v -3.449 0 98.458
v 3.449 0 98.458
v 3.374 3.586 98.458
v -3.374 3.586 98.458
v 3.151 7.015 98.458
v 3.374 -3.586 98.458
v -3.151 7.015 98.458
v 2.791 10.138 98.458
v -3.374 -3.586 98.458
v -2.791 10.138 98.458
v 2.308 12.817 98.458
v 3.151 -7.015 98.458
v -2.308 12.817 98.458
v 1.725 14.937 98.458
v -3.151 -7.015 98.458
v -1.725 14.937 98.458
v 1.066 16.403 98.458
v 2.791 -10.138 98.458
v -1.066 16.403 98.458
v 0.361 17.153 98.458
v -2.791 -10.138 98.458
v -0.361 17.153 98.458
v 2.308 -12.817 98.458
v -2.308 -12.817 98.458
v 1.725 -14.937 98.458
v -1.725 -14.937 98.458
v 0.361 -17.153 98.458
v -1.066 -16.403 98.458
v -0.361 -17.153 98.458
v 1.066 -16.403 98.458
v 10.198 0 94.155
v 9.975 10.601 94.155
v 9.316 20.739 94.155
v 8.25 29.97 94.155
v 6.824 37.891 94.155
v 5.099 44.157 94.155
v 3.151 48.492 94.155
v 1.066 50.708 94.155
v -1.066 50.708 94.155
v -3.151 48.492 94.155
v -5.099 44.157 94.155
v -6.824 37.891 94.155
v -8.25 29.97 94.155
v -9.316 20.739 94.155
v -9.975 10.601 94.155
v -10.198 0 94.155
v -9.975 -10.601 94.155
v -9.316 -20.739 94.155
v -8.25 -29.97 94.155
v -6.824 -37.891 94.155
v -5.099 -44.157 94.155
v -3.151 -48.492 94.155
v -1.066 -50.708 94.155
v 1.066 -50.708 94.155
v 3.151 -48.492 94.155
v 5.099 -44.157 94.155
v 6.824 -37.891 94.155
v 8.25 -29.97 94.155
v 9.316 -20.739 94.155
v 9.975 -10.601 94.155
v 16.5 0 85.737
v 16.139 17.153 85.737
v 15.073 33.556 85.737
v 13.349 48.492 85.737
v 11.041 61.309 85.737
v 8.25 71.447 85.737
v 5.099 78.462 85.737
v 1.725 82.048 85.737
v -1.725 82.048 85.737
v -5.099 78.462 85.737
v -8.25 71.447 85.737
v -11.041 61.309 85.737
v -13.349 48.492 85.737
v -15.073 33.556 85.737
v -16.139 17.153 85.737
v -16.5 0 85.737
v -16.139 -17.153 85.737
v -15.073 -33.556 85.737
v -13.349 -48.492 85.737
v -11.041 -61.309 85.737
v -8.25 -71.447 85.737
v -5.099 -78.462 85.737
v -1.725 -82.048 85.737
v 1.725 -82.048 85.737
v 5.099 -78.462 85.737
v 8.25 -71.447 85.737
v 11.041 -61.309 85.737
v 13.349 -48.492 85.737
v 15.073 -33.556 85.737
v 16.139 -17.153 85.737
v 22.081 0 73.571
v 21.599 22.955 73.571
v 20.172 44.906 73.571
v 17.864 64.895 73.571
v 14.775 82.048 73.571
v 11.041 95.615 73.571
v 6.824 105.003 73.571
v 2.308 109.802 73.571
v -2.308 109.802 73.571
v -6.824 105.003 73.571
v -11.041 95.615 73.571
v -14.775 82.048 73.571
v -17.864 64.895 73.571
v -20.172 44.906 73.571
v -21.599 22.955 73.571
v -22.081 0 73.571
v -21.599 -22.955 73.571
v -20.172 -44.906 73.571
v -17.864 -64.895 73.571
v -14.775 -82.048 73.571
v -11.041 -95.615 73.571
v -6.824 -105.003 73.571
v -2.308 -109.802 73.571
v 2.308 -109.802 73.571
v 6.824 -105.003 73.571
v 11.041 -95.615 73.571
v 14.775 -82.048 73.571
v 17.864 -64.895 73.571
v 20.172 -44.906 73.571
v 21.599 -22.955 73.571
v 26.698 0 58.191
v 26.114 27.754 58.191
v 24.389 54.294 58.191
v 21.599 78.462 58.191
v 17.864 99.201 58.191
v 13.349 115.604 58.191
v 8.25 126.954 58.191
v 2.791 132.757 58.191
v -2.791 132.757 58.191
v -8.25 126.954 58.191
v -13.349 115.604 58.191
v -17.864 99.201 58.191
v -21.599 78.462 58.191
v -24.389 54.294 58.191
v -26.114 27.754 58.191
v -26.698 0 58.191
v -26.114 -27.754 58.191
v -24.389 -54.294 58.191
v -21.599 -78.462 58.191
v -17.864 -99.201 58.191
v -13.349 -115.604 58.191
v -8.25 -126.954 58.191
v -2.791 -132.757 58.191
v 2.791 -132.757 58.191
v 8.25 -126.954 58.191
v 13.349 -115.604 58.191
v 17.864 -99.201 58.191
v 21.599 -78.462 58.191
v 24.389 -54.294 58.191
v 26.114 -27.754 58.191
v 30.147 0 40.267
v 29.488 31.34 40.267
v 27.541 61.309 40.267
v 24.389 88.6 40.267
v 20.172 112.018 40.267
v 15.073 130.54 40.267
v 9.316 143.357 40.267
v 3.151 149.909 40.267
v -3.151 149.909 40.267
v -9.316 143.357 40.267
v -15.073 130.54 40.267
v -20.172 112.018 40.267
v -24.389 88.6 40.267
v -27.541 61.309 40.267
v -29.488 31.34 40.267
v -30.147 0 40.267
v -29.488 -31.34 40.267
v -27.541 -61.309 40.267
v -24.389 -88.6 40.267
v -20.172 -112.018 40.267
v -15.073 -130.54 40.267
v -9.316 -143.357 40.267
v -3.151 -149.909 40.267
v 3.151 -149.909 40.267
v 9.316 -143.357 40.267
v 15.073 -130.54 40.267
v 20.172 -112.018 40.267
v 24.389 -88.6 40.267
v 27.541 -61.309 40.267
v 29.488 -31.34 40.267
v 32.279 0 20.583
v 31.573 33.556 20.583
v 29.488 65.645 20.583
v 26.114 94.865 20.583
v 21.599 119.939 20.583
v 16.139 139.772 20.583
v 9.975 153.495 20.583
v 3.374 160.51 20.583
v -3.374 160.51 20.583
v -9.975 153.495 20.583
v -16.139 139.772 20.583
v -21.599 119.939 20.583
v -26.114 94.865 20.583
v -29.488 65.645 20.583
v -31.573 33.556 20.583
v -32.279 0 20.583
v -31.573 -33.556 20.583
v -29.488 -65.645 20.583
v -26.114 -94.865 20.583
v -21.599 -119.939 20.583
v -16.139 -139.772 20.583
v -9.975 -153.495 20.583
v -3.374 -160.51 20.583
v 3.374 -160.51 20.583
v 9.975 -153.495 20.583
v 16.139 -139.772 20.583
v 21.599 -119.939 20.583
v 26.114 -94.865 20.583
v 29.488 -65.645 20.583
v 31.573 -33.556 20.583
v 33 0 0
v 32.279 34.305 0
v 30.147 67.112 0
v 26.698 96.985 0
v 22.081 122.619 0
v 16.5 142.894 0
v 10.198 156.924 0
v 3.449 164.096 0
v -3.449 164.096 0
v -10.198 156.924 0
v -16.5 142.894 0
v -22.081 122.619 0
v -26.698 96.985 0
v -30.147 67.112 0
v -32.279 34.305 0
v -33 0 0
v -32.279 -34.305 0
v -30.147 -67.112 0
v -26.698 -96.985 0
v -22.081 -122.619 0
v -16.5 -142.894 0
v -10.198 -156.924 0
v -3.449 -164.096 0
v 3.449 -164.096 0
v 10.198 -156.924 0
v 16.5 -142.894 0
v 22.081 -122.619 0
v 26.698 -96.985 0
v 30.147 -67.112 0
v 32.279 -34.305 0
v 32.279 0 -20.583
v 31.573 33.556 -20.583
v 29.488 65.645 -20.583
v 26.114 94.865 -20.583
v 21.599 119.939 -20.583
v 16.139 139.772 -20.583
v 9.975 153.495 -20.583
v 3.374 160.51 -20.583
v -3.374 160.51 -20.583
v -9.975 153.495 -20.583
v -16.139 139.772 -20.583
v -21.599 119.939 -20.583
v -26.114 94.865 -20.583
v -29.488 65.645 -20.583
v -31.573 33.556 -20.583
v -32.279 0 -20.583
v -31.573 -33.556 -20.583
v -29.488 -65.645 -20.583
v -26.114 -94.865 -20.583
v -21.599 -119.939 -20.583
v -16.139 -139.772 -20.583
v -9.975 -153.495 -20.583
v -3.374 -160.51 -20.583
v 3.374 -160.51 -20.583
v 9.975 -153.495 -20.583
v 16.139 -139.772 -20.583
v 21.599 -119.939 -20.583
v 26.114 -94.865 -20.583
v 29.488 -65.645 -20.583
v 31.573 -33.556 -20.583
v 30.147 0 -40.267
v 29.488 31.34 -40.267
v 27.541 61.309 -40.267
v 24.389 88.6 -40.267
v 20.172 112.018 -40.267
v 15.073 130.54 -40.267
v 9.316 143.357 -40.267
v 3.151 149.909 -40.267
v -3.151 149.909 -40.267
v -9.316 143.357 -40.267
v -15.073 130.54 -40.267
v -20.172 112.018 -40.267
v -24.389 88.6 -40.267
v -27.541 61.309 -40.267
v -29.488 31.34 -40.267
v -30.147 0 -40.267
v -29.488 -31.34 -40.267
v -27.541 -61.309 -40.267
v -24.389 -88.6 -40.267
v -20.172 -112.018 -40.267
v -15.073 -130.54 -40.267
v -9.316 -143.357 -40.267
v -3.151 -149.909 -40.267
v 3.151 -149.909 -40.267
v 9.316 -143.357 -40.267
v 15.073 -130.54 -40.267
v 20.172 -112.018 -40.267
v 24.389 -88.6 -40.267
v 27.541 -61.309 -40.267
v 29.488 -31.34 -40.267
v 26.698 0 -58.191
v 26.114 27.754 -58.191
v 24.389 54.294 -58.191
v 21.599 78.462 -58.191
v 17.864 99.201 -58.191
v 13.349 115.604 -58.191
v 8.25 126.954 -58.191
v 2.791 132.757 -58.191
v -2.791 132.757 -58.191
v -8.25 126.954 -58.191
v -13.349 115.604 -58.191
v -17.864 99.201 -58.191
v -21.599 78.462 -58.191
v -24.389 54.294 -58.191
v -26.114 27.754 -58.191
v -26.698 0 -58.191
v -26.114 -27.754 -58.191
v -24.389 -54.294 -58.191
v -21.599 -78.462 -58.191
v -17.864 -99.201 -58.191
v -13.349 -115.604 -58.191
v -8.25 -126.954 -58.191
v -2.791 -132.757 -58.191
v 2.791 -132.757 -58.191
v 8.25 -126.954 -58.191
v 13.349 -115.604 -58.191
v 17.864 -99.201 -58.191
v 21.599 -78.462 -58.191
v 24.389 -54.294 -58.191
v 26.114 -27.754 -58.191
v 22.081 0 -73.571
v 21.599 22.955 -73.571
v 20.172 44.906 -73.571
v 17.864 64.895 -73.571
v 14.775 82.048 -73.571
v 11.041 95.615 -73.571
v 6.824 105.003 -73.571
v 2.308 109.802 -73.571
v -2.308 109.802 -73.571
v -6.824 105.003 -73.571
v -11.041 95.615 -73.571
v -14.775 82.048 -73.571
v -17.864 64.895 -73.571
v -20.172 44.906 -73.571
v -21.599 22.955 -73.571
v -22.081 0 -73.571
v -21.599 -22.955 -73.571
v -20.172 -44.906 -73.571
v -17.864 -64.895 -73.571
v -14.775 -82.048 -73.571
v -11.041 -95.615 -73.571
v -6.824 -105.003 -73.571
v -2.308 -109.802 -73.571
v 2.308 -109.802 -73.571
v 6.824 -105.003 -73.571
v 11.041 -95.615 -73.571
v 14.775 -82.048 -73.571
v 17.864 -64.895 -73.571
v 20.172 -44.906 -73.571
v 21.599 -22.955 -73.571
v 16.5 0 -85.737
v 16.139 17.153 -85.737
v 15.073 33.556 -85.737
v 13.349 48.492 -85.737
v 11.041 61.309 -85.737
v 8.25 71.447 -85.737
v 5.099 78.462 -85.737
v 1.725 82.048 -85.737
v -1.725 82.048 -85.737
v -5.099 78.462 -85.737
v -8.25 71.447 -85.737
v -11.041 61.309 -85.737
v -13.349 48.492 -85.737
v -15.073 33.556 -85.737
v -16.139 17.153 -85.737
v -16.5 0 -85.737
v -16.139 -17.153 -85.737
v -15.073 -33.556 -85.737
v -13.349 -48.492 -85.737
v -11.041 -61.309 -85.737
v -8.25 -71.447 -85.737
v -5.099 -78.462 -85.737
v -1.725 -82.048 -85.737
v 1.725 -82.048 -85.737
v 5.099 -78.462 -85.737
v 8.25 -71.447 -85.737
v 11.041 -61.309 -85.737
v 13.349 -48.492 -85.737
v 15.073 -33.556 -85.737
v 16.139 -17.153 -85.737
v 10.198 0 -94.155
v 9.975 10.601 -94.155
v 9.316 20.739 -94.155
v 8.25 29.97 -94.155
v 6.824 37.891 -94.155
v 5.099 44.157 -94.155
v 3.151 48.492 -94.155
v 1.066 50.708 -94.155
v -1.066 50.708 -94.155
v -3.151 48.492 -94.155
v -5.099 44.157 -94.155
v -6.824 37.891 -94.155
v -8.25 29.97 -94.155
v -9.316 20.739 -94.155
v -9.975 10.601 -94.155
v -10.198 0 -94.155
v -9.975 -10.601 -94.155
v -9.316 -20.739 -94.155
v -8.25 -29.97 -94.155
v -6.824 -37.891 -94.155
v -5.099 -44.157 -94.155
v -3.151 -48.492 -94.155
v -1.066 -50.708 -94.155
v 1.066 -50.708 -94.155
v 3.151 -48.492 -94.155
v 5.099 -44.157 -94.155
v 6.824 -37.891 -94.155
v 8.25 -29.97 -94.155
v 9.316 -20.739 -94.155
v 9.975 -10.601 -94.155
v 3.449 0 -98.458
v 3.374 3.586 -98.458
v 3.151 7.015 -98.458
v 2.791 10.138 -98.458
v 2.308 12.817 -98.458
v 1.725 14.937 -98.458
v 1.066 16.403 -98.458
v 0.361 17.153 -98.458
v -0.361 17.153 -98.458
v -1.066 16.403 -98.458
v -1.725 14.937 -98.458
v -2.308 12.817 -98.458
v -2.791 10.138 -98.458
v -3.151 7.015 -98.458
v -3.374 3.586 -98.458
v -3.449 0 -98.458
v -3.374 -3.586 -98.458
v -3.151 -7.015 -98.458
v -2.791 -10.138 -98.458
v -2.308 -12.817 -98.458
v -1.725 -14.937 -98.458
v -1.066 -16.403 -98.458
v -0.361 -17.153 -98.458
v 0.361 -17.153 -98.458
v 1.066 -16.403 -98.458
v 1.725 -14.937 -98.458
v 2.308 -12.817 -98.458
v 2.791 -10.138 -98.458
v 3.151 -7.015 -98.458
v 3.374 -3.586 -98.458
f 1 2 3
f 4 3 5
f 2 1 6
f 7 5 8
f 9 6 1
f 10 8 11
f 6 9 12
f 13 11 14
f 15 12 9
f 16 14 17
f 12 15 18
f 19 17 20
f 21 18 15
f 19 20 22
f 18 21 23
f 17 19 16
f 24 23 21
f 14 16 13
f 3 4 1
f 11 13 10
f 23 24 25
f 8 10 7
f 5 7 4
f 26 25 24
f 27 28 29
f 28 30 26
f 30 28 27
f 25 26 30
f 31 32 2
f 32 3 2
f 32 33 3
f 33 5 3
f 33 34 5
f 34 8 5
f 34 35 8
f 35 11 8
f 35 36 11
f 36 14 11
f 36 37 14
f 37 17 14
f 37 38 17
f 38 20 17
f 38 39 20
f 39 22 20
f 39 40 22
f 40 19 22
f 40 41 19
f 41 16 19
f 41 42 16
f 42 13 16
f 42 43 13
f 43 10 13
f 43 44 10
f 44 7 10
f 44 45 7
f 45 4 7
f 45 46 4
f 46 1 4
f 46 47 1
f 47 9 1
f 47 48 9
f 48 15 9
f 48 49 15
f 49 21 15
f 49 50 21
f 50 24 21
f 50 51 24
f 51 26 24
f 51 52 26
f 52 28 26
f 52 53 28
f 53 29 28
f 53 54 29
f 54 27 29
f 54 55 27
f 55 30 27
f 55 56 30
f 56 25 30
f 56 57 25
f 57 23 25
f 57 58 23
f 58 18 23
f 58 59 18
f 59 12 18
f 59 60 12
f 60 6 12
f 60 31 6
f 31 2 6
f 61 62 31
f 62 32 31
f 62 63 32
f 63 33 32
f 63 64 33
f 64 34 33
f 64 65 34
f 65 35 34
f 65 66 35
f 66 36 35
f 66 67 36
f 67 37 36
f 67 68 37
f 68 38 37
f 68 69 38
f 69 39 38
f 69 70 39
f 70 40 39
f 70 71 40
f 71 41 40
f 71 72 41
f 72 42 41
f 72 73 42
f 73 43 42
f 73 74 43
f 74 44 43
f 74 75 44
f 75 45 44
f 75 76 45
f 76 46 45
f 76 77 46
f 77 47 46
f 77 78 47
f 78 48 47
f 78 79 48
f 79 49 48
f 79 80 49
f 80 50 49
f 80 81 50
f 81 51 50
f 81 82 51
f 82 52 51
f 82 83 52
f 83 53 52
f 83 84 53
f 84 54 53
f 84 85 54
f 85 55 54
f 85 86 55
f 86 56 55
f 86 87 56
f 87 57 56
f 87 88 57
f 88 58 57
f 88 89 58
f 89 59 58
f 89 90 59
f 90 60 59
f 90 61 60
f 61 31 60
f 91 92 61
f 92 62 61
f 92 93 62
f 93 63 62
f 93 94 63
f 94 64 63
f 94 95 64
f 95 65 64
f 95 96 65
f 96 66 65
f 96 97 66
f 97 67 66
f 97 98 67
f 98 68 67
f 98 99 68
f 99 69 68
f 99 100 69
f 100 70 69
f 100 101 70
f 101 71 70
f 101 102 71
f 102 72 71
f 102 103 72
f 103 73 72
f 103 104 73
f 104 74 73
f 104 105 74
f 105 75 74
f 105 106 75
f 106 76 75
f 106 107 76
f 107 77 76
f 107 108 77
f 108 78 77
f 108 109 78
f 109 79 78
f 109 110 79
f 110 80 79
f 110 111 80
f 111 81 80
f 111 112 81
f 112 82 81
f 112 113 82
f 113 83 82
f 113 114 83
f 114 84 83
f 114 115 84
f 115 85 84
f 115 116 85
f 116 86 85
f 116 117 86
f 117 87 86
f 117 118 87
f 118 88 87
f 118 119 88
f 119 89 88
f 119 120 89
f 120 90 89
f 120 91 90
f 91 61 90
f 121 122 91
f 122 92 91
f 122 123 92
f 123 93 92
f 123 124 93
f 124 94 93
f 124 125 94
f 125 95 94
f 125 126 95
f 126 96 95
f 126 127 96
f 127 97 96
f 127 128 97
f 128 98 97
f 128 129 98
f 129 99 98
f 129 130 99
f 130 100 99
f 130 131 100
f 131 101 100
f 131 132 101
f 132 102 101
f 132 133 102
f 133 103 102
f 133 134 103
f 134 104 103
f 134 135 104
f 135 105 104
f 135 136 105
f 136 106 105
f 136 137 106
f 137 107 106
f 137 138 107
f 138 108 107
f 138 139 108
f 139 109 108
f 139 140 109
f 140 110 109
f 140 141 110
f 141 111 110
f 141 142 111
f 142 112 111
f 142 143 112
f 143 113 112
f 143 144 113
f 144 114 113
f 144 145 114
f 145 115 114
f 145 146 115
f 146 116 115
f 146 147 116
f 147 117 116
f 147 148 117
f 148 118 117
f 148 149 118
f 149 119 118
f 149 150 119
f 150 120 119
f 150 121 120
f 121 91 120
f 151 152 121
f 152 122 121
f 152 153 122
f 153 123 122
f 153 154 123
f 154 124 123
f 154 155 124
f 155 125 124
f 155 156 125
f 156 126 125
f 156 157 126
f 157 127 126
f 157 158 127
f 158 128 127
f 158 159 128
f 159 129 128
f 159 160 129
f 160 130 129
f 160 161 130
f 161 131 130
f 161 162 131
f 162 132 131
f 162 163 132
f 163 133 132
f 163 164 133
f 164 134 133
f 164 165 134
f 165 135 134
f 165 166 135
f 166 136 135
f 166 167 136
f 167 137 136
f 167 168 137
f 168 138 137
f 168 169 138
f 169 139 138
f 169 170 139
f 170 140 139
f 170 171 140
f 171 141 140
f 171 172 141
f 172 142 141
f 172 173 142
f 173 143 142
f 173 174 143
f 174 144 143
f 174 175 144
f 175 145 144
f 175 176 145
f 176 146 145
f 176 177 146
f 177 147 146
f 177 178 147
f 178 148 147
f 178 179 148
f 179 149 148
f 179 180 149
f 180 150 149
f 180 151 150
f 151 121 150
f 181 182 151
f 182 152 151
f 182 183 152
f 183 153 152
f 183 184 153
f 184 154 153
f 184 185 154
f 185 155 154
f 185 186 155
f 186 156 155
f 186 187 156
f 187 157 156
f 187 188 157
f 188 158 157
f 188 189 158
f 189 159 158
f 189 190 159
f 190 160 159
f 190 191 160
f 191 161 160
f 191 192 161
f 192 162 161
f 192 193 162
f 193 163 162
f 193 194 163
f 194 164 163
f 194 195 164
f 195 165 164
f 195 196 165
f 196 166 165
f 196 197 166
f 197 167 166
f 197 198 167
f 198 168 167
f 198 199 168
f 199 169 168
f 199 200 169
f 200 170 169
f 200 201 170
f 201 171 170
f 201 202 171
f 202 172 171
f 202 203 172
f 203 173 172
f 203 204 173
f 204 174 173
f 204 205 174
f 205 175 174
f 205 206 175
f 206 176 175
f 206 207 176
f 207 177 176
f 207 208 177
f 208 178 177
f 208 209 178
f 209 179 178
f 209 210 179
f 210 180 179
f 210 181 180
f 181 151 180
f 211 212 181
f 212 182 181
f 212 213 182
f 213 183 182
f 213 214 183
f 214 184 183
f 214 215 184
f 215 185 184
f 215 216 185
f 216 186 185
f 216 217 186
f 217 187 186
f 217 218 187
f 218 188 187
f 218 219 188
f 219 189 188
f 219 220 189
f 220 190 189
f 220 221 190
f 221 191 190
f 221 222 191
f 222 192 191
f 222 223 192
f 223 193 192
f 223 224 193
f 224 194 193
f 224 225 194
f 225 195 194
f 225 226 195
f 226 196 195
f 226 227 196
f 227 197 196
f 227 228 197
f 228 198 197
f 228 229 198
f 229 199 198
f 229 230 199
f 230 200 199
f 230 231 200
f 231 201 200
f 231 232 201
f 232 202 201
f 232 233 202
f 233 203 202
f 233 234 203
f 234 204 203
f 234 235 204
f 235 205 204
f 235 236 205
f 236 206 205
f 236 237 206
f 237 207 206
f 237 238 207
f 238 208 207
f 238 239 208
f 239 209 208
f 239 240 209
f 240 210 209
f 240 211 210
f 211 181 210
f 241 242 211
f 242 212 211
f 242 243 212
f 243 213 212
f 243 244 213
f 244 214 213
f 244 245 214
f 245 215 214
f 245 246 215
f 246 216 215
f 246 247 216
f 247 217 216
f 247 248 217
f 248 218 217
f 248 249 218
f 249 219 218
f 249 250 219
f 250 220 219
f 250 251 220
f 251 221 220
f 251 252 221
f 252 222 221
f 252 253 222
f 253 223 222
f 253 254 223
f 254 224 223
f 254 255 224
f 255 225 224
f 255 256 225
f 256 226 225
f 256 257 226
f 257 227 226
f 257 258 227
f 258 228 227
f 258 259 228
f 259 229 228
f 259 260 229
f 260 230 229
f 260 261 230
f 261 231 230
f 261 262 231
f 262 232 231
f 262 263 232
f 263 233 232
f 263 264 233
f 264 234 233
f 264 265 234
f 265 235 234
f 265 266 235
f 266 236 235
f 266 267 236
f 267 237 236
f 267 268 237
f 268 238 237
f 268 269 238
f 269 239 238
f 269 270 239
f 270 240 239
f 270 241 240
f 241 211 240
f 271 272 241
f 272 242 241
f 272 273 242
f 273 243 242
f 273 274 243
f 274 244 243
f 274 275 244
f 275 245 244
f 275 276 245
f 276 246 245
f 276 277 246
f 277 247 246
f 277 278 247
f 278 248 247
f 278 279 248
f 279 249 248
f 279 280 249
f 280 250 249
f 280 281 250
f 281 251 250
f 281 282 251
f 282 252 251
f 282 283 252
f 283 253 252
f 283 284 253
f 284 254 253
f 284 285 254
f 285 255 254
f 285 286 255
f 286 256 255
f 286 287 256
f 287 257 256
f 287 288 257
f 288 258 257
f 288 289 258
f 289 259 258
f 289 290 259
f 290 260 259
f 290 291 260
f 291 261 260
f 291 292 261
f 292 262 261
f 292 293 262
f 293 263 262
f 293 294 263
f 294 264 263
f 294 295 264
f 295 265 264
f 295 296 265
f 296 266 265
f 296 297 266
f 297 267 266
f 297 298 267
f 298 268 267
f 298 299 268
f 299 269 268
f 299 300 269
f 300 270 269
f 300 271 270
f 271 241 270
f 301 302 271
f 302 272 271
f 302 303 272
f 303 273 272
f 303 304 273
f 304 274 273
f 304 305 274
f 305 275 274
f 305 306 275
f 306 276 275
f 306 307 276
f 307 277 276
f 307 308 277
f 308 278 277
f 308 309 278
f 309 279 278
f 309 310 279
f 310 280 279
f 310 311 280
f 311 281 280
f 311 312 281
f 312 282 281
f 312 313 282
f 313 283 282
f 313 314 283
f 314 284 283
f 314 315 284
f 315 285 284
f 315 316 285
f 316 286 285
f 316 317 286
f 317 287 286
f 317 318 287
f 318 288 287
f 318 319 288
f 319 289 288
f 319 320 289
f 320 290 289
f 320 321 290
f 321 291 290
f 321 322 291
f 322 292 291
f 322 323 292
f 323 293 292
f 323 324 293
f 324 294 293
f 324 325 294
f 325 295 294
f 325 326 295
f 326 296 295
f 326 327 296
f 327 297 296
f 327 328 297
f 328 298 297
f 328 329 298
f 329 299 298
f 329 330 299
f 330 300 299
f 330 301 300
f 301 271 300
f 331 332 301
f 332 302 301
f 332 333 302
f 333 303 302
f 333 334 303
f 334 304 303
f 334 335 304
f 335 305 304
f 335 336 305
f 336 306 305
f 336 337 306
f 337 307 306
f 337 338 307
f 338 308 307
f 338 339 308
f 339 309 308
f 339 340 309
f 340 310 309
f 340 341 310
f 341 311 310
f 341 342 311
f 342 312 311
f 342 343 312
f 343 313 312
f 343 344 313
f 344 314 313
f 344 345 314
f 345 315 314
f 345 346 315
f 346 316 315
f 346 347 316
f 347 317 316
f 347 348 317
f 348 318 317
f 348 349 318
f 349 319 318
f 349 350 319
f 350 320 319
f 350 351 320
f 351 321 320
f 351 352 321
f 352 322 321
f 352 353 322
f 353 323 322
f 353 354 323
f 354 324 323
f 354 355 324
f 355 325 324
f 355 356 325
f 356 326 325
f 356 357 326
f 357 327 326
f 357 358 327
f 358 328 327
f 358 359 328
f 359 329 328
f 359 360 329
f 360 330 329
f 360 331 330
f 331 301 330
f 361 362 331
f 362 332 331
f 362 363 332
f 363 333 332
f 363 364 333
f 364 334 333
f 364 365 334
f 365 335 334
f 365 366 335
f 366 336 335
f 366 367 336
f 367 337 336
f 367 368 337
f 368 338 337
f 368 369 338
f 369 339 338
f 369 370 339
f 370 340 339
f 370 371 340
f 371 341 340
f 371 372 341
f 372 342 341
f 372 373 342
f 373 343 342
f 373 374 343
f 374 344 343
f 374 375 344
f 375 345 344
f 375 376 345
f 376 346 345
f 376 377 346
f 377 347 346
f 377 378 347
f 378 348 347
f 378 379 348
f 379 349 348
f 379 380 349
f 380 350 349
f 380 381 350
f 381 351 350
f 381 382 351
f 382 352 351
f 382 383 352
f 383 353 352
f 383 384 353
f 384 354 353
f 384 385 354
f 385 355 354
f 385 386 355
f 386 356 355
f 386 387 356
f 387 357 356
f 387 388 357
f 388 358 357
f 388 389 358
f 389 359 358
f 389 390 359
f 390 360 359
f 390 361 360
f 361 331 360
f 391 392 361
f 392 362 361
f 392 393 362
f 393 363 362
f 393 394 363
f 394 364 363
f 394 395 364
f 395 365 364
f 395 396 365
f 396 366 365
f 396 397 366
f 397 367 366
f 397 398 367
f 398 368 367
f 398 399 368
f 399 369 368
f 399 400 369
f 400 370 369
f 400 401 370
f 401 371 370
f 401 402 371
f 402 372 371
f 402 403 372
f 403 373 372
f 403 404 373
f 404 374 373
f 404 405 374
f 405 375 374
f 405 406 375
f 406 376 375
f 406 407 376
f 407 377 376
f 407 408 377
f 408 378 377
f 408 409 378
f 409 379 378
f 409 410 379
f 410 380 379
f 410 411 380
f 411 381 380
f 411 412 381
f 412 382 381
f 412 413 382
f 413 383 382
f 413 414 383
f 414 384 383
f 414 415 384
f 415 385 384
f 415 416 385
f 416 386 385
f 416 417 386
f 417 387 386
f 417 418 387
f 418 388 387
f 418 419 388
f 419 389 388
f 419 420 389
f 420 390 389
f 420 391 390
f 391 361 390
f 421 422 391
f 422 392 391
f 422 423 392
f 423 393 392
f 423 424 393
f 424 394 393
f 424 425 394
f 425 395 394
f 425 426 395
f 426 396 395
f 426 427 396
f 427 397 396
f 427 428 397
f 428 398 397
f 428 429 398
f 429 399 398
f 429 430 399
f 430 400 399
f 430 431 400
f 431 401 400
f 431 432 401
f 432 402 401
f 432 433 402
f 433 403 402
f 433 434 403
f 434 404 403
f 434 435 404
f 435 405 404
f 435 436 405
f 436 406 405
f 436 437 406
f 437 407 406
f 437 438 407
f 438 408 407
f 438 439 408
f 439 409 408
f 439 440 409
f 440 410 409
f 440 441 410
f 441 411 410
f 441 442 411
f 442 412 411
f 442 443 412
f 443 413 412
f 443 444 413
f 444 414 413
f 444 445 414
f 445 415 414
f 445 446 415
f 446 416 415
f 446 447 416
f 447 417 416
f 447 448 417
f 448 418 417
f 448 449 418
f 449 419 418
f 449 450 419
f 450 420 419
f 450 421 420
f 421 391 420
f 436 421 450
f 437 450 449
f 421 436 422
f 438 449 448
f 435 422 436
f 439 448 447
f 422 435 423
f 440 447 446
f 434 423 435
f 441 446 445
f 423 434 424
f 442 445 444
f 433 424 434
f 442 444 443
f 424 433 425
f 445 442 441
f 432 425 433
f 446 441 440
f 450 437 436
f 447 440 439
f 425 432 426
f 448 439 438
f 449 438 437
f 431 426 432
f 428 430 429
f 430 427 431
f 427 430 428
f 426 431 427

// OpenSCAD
// Generated by SolidPython 1.0.1 on 2020-07-29 00:46:45


scale(v = [3, 15, 9]) {
	sphere(r = 11);
}
/***********************************************
*********      SolidPython code:      **********
************************************************
 
# import packages: SolidPython
from solid import *
from solid.utils import *
from itertools import chain, combinations, permutations


class Resize:

    def __init__(self, scad_file):
        self.scad_file = scad_file
        #self.scad_file = import_scad(scad_file)
        # cone/cylinder param:
        self.r1 = 0
        self.r2 = 0
        self.h = 0
        # rectangular prism param:
        self.w = 0
        self.l = 0
        # ellipse param:
        self.r = 0

    # import OpenScad code (file name corresponds to shape)


    # classify shape + parameters
    def assign(self, param1, param2, param3):
        if self.scad_file == 'cone.scad':
            self.r1 = param1
            self.r2 = param2
            self.h = param3
        elif self.scad_file == 'cylinder.scad':
            self.r1 = param1
            self.r2 = param2
            self.h = param3
        elif self.scad_file == 'rectangularPrism.scad':
            self.h = param1
            self.l = param2
            self.w = param3
        else:
            self.r = param1
            self.h = param2

    # resize parameters
    def iterate(self):
        x = range(3, 20, 2)
        i = 1
        if self.scad_file == 'cone.scad':
            tempList = list(permutations(x, 2))
            for temp in tempList:
                param1 = temp[0]
                param2 = temp[1]
                filepath = 'produced_scad_files/' + 'cone' + str(param1) + '_' + str(param2) + '_' + '.scad'
                scad_render_to_file(cylinder(h=param1, r1=param2, r2=0), filepath)

        elif self.scad_file == 'cylinder.scad':
            tempList = list(permutations(x, 3))
            for temp in tempList:
                param1 = temp[0]
                param2 = temp[1]
                filepath = 'produced_scad_files/' + 'cylinder' + str(param1) + '_' + str(param2) + '_' + '.scad'
                scad_render_to_file(cylinder(h=param1, r1=param2, r2=param2), filepath)

        elif self.scad_file == 'rectangularPrism.scad':
            tempList = list(permutations(x, 3))
            for temp in tempList:
                param1 = temp[0]
                param2 = temp[1]
                param3 = temp[2]
                filepath = 'produced_scad_files/' + 'rectangularPrism' + str(param1) + '_' + str(param2) + '_' + str(
                    param3) + '.scad'
                scad_render_to_file(cube(size=(param1, param2, param3)), filepath)

        elif self.scad_file == 'ellipse.scad':
            tempList = list(permutations(x, 4))
            for temp in tempList:
                param1 = temp[0]
                param2 = temp[1]
                param3 = temp[2]
                param4 = temp[3]
                filepath = 'produced_scad_files/' + 'ellipse' + str(param1) + '_' + str(param2) + '_' + str(param3) + '_' + str(param4) + '.scad'
                scad_render_to_file(scale([param1, param2, param3])(sphere(r=param4)), filepath)

    def render_to_scadfile(self):
        scad_render_to_file(scad, 'example.scad') 
 
************************************************/
